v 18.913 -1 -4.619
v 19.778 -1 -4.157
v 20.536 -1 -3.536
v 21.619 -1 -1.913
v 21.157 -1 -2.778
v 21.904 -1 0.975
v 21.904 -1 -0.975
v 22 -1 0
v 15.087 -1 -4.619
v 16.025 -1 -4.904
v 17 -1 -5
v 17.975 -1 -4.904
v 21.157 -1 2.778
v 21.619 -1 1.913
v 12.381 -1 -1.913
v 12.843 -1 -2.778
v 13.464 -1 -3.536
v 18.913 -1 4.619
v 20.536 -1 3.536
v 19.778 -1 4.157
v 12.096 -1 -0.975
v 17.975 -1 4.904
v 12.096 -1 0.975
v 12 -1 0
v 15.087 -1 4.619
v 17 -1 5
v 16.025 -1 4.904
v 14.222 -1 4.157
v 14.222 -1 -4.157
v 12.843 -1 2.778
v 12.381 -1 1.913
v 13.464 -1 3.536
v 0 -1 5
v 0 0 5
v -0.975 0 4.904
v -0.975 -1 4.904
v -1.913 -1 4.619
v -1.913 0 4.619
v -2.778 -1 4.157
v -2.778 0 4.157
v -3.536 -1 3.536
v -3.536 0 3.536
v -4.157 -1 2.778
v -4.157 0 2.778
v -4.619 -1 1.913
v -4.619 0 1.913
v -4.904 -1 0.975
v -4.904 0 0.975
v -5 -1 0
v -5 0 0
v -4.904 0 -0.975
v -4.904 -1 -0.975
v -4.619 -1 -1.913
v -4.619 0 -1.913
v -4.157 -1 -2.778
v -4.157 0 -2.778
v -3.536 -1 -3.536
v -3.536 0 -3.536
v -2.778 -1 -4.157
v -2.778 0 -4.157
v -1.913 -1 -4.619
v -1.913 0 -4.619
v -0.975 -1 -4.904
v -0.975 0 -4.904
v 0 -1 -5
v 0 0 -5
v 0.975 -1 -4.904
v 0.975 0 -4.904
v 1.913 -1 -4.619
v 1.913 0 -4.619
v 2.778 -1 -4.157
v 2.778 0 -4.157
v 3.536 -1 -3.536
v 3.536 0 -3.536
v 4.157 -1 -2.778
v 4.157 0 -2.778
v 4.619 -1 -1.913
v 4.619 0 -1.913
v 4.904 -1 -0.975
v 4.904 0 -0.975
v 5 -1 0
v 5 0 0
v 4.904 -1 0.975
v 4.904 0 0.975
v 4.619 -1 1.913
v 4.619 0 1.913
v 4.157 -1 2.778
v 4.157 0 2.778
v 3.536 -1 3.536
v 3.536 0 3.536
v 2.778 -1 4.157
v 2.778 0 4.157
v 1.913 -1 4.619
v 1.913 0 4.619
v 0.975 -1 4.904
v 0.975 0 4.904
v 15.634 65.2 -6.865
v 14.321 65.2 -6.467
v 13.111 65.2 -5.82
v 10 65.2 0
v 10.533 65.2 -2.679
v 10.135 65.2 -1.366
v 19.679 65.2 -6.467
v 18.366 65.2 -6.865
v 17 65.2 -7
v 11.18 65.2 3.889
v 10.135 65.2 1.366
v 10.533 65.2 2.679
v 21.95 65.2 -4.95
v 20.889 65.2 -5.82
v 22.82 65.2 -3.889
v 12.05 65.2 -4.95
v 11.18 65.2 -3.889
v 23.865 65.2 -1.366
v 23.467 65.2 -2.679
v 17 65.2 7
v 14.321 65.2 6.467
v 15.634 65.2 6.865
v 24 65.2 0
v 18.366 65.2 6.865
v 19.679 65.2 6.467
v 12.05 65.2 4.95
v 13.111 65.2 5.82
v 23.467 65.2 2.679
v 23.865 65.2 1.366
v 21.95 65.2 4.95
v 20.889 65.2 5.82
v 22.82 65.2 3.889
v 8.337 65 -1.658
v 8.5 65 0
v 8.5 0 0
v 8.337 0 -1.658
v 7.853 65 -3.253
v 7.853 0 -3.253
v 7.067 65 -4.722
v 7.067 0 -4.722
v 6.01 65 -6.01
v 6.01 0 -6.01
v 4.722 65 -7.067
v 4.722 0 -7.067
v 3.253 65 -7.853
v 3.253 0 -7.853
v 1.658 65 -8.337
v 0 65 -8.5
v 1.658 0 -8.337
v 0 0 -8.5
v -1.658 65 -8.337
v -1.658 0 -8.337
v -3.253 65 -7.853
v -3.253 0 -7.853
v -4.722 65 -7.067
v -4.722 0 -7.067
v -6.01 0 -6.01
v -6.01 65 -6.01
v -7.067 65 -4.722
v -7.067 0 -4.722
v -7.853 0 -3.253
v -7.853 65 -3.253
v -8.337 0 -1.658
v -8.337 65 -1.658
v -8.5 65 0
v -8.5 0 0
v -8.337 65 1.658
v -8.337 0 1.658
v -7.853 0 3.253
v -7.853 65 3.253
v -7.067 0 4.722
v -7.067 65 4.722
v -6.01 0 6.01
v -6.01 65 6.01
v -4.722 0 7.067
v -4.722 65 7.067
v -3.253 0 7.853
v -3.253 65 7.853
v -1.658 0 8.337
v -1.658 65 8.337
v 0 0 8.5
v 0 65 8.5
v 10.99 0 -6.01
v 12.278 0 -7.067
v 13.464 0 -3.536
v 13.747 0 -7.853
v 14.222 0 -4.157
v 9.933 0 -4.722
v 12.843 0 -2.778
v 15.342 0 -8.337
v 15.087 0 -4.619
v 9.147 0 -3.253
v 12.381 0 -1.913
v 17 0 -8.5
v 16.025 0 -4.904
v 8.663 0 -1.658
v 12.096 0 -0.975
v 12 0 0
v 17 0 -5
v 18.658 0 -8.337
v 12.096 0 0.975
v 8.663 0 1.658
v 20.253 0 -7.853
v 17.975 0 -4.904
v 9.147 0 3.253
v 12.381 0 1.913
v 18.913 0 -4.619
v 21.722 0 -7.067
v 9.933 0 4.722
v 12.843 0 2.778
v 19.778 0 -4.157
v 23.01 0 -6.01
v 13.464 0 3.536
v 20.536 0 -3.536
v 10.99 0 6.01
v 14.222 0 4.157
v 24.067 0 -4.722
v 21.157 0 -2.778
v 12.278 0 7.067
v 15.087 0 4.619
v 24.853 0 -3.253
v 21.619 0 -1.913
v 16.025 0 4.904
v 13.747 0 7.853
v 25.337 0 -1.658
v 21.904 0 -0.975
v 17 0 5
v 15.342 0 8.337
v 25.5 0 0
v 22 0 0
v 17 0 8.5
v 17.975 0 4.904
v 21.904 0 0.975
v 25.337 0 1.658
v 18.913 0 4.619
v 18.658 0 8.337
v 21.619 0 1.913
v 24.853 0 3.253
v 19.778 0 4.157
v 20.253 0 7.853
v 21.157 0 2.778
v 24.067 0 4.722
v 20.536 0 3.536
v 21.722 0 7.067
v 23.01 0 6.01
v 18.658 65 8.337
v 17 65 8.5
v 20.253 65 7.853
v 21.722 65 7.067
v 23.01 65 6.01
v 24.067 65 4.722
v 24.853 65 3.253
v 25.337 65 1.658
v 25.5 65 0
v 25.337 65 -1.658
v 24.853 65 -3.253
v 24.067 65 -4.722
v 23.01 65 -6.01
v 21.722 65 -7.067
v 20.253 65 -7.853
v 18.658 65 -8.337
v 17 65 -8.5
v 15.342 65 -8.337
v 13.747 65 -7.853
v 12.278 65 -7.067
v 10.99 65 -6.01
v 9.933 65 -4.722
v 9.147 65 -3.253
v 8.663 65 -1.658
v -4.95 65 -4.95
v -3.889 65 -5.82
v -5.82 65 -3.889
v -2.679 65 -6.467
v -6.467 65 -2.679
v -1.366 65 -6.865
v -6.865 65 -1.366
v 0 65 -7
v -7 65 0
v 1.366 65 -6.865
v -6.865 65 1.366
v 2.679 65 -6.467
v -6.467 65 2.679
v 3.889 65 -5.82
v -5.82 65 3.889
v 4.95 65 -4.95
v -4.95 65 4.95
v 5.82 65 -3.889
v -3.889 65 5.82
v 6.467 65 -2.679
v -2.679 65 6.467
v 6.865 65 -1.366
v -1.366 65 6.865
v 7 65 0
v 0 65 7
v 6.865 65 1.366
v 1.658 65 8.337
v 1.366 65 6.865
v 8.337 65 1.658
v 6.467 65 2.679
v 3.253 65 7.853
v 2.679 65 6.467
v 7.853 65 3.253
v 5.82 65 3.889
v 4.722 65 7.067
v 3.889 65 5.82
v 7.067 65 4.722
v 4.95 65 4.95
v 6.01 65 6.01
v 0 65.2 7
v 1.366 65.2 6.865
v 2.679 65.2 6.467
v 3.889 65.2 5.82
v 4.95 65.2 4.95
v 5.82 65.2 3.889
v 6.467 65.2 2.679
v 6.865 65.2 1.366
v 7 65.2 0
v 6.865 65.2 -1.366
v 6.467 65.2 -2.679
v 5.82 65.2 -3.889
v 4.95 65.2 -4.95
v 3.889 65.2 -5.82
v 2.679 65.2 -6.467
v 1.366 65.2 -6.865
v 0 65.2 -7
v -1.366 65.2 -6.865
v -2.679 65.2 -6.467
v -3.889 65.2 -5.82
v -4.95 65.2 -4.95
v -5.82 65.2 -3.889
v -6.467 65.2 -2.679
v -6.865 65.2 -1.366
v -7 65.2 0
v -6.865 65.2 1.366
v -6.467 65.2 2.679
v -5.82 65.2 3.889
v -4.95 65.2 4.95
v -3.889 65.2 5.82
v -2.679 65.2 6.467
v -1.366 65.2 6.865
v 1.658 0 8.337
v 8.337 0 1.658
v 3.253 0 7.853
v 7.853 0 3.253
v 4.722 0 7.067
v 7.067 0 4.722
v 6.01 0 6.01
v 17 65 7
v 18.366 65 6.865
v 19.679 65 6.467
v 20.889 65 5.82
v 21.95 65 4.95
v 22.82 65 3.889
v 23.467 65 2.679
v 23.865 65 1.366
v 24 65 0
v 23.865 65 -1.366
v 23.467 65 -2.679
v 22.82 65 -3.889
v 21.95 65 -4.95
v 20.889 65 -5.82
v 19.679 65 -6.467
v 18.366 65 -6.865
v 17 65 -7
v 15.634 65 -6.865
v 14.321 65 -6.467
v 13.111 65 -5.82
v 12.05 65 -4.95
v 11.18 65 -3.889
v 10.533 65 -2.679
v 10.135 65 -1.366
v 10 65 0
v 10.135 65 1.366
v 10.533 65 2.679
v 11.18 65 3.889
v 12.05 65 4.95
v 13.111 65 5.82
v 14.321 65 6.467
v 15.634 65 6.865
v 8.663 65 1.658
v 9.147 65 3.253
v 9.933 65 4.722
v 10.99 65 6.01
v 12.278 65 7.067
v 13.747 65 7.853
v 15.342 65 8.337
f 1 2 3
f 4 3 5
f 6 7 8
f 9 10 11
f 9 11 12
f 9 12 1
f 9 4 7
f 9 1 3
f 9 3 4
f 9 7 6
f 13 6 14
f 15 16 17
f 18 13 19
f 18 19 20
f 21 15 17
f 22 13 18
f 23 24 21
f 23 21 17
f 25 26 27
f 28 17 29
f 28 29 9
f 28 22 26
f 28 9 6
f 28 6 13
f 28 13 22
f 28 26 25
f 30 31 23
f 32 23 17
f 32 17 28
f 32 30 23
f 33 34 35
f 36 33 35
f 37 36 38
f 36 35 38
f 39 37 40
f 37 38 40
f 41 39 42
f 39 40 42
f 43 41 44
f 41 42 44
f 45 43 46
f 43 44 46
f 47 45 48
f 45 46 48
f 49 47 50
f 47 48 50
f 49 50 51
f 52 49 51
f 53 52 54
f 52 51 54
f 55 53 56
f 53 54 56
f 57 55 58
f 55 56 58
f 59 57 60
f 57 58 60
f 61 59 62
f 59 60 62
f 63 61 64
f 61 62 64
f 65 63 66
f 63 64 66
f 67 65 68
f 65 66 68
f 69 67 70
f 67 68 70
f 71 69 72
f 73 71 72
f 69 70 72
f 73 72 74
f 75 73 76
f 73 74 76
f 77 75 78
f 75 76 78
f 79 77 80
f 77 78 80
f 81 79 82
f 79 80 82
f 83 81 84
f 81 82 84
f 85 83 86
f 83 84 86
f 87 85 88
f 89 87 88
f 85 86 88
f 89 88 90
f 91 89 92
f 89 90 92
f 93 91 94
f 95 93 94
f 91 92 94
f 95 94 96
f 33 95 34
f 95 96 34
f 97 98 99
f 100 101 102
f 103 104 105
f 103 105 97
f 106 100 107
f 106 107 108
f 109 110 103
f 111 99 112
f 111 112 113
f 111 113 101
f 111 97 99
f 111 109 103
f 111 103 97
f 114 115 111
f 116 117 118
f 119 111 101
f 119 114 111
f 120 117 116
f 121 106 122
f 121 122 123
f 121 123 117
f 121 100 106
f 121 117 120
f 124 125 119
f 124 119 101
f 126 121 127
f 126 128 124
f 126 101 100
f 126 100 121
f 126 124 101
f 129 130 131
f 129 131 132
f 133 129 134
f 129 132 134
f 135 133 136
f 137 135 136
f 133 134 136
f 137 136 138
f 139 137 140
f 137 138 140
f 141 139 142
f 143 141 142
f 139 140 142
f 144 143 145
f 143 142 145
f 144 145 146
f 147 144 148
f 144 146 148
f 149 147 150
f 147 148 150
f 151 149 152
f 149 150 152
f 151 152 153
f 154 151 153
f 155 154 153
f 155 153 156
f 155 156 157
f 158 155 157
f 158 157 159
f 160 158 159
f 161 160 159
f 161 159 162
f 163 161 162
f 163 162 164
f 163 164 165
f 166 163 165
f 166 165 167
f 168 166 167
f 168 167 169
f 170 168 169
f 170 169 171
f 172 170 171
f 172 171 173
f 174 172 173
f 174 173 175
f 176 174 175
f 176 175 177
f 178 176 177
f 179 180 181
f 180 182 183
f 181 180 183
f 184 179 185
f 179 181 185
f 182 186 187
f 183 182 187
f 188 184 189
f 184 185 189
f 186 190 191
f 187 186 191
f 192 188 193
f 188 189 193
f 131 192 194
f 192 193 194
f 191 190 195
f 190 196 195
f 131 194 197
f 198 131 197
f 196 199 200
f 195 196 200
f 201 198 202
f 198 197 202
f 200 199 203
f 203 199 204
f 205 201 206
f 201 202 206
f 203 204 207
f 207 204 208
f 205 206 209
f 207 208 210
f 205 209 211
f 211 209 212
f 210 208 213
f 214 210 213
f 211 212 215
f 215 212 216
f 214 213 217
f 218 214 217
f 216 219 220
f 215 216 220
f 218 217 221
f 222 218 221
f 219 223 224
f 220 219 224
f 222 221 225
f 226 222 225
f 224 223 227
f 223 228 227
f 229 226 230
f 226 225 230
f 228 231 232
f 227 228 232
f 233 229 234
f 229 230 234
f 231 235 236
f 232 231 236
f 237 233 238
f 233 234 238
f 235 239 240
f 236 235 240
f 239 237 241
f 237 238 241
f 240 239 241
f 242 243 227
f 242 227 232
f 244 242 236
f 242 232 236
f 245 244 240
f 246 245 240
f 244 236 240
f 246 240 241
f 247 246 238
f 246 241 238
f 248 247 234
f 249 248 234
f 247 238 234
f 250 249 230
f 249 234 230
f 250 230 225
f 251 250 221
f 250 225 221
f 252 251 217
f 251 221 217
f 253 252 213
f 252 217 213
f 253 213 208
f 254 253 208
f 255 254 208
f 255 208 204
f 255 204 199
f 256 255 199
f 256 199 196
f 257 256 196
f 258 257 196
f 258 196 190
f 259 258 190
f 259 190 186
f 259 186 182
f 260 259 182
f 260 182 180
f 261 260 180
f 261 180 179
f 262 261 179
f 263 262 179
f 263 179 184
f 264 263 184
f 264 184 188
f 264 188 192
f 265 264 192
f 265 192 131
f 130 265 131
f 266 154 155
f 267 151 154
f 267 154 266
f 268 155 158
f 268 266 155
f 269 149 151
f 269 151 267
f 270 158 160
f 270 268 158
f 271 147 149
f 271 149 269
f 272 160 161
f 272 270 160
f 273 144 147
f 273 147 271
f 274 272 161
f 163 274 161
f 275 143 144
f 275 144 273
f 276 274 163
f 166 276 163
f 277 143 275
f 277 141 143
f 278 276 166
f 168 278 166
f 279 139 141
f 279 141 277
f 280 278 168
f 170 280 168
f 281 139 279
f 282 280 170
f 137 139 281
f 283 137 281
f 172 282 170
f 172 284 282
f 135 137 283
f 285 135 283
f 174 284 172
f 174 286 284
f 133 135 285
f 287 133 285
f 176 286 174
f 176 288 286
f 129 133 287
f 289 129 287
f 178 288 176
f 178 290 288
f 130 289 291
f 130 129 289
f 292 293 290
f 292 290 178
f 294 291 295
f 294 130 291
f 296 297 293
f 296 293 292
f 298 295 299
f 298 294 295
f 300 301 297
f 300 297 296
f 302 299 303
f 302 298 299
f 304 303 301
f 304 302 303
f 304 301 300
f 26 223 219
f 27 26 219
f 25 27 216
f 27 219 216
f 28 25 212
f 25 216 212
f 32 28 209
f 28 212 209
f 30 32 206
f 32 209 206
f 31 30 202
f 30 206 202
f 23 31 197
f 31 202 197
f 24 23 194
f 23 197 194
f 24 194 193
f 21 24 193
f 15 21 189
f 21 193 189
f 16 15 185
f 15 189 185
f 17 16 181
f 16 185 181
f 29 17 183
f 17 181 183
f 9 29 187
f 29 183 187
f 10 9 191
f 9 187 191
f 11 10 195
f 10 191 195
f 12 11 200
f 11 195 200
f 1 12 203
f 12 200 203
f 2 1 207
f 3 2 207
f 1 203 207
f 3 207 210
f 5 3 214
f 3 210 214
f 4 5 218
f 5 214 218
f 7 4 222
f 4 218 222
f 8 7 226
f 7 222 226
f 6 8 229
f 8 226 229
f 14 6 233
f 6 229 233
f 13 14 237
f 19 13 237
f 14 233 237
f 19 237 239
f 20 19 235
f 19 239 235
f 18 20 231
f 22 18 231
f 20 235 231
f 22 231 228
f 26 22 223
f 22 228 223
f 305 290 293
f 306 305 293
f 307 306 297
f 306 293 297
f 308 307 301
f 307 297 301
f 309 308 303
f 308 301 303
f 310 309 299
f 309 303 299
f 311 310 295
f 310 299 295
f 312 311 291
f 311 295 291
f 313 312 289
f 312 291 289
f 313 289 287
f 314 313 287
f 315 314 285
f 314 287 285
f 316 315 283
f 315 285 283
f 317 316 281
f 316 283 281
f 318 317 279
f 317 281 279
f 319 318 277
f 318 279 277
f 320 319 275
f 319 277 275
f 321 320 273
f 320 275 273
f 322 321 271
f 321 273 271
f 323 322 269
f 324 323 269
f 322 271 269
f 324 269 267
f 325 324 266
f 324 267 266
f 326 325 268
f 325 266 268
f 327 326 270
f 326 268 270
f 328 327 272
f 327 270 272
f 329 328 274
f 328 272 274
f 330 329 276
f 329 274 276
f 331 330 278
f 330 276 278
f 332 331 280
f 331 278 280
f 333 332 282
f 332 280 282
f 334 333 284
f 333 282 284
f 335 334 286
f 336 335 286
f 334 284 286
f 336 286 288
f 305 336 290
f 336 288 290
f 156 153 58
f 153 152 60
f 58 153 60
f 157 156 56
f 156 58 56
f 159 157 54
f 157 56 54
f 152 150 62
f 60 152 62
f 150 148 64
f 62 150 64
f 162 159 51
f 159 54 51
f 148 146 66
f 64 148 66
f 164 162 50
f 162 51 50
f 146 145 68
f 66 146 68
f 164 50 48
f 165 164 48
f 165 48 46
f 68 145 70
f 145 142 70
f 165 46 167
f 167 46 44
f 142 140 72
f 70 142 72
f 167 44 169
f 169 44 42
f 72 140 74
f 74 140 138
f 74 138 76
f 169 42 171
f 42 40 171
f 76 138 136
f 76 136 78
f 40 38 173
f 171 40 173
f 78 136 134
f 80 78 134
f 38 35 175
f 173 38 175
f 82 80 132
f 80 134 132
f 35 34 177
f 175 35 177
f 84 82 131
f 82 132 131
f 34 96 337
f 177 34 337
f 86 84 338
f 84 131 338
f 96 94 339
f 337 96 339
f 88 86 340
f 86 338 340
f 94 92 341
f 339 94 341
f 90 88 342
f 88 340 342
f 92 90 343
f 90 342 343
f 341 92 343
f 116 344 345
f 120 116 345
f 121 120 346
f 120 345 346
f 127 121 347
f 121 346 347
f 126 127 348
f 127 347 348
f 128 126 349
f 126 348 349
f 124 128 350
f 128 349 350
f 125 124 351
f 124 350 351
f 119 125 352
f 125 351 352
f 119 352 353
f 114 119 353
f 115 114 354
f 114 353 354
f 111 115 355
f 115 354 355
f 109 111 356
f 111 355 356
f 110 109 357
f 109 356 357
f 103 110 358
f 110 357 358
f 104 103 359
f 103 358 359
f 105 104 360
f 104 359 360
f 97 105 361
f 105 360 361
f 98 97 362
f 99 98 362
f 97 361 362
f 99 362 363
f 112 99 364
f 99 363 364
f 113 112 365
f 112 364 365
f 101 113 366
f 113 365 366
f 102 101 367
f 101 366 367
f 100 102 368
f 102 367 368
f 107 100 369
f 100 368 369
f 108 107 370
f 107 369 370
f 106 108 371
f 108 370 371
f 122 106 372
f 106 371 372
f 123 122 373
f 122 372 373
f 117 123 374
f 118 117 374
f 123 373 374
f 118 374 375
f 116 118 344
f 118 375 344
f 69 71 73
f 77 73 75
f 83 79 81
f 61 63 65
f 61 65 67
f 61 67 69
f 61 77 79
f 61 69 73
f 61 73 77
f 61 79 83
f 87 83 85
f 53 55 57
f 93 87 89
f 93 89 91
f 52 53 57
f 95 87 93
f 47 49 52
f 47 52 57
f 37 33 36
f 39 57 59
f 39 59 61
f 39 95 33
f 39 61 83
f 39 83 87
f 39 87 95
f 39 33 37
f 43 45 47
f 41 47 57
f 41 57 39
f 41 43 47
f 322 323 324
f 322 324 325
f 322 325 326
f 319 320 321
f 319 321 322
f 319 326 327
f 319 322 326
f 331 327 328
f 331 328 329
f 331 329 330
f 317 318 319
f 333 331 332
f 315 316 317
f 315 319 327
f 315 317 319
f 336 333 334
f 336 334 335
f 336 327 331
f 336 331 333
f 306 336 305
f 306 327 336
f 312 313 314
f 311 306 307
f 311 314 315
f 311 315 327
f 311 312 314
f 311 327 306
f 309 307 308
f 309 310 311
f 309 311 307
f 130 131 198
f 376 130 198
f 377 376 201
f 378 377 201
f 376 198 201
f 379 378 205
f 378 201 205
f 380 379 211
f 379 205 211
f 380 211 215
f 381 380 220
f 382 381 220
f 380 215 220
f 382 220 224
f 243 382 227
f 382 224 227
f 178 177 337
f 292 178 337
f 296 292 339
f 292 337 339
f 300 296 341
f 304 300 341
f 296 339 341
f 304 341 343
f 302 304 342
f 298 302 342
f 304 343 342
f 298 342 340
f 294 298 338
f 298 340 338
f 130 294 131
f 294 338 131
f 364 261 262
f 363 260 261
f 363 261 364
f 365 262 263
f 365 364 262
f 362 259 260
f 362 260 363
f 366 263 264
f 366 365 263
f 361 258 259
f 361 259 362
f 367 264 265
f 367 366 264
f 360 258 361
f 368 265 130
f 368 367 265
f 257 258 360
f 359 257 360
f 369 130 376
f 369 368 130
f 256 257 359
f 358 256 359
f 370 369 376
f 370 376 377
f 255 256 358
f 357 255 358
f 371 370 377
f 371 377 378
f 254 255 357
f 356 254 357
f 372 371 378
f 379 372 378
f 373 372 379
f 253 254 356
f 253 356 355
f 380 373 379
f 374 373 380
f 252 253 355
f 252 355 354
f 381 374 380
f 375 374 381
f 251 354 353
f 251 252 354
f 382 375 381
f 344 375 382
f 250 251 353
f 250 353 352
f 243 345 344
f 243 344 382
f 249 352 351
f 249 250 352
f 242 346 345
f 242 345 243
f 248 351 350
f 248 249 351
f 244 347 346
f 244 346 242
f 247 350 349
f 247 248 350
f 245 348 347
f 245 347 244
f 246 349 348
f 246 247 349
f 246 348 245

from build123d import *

# Parameters (mm, degrees)
SKETCH1_R             = 8.5
BOSS_EXTRUDE1_DEPTH   = 65
BOSS_EXTRUDE1_2_DEPTH = 65
SKETCH2_R             = 5
BOSS_EXTRUDE2_DEPTH   = 1
SKETCH3_R             = 7
BOSS_EXTRUDE3_DEPTH   = 0.2


with BuildPart() as part:
    # Sketch1 → Boss-Extrude1 (new body)
    with BuildSketch(Plane(origin=(0, 0, 0), x_dir=(1, 0, 0), z_dir=(0, 1, 0))):
        with Locations(Location((0, 0, 0), (0, 0, 270))):
            Circle(SKETCH1_R)
    extrude(amount=BOSS_EXTRUDE1_DEPTH)



with BuildPart() as body_2:
    # Sketch1 → Boss-Extrude1 2 (new body)
    with BuildSketch(Plane(origin=(0, 0, 0), x_dir=(1, 0, 0), z_dir=(0, 1, 0))):
        with Locations(Location((17, 0, 0), (0, 0, 270))):
            Circle(SKETCH1_R)
    extrude(amount=BOSS_EXTRUDE1_2_DEPTH)


with BuildPart() as part_1:
    add(part.part)

    add(body_2.part)  # Boss-Extrude2 merges body 2
    # Sketch2 → Boss-Extrude2 (add)
    with BuildSketch(Plane.XZ):
        with Locations(Location((17, 0, 0), (0, 0, 90))):
            Circle(SKETCH2_R)
        with Locations(Location((0, 0, 0), (0, 0, 90))):
            Circle(SKETCH2_R)
    extrude(amount=BOSS_EXTRUDE2_DEPTH)

    # Sketch3 → Boss-Extrude3 (add)
    with BuildSketch(Plane(origin=(0, 65, 0), x_dir=(1, 0, 0), z_dir=(0, 1, 0))):
        with Locations(Location((17, 0, 0), (0, 0, 270))):
            Circle(SKETCH3_R)
        with Locations(Location((0, 0, 0), (0, 0, 270))):
            Circle(SKETCH3_R)
    extrude(amount=BOSS_EXTRUDE3_DEPTH)


solid = part_1.part
